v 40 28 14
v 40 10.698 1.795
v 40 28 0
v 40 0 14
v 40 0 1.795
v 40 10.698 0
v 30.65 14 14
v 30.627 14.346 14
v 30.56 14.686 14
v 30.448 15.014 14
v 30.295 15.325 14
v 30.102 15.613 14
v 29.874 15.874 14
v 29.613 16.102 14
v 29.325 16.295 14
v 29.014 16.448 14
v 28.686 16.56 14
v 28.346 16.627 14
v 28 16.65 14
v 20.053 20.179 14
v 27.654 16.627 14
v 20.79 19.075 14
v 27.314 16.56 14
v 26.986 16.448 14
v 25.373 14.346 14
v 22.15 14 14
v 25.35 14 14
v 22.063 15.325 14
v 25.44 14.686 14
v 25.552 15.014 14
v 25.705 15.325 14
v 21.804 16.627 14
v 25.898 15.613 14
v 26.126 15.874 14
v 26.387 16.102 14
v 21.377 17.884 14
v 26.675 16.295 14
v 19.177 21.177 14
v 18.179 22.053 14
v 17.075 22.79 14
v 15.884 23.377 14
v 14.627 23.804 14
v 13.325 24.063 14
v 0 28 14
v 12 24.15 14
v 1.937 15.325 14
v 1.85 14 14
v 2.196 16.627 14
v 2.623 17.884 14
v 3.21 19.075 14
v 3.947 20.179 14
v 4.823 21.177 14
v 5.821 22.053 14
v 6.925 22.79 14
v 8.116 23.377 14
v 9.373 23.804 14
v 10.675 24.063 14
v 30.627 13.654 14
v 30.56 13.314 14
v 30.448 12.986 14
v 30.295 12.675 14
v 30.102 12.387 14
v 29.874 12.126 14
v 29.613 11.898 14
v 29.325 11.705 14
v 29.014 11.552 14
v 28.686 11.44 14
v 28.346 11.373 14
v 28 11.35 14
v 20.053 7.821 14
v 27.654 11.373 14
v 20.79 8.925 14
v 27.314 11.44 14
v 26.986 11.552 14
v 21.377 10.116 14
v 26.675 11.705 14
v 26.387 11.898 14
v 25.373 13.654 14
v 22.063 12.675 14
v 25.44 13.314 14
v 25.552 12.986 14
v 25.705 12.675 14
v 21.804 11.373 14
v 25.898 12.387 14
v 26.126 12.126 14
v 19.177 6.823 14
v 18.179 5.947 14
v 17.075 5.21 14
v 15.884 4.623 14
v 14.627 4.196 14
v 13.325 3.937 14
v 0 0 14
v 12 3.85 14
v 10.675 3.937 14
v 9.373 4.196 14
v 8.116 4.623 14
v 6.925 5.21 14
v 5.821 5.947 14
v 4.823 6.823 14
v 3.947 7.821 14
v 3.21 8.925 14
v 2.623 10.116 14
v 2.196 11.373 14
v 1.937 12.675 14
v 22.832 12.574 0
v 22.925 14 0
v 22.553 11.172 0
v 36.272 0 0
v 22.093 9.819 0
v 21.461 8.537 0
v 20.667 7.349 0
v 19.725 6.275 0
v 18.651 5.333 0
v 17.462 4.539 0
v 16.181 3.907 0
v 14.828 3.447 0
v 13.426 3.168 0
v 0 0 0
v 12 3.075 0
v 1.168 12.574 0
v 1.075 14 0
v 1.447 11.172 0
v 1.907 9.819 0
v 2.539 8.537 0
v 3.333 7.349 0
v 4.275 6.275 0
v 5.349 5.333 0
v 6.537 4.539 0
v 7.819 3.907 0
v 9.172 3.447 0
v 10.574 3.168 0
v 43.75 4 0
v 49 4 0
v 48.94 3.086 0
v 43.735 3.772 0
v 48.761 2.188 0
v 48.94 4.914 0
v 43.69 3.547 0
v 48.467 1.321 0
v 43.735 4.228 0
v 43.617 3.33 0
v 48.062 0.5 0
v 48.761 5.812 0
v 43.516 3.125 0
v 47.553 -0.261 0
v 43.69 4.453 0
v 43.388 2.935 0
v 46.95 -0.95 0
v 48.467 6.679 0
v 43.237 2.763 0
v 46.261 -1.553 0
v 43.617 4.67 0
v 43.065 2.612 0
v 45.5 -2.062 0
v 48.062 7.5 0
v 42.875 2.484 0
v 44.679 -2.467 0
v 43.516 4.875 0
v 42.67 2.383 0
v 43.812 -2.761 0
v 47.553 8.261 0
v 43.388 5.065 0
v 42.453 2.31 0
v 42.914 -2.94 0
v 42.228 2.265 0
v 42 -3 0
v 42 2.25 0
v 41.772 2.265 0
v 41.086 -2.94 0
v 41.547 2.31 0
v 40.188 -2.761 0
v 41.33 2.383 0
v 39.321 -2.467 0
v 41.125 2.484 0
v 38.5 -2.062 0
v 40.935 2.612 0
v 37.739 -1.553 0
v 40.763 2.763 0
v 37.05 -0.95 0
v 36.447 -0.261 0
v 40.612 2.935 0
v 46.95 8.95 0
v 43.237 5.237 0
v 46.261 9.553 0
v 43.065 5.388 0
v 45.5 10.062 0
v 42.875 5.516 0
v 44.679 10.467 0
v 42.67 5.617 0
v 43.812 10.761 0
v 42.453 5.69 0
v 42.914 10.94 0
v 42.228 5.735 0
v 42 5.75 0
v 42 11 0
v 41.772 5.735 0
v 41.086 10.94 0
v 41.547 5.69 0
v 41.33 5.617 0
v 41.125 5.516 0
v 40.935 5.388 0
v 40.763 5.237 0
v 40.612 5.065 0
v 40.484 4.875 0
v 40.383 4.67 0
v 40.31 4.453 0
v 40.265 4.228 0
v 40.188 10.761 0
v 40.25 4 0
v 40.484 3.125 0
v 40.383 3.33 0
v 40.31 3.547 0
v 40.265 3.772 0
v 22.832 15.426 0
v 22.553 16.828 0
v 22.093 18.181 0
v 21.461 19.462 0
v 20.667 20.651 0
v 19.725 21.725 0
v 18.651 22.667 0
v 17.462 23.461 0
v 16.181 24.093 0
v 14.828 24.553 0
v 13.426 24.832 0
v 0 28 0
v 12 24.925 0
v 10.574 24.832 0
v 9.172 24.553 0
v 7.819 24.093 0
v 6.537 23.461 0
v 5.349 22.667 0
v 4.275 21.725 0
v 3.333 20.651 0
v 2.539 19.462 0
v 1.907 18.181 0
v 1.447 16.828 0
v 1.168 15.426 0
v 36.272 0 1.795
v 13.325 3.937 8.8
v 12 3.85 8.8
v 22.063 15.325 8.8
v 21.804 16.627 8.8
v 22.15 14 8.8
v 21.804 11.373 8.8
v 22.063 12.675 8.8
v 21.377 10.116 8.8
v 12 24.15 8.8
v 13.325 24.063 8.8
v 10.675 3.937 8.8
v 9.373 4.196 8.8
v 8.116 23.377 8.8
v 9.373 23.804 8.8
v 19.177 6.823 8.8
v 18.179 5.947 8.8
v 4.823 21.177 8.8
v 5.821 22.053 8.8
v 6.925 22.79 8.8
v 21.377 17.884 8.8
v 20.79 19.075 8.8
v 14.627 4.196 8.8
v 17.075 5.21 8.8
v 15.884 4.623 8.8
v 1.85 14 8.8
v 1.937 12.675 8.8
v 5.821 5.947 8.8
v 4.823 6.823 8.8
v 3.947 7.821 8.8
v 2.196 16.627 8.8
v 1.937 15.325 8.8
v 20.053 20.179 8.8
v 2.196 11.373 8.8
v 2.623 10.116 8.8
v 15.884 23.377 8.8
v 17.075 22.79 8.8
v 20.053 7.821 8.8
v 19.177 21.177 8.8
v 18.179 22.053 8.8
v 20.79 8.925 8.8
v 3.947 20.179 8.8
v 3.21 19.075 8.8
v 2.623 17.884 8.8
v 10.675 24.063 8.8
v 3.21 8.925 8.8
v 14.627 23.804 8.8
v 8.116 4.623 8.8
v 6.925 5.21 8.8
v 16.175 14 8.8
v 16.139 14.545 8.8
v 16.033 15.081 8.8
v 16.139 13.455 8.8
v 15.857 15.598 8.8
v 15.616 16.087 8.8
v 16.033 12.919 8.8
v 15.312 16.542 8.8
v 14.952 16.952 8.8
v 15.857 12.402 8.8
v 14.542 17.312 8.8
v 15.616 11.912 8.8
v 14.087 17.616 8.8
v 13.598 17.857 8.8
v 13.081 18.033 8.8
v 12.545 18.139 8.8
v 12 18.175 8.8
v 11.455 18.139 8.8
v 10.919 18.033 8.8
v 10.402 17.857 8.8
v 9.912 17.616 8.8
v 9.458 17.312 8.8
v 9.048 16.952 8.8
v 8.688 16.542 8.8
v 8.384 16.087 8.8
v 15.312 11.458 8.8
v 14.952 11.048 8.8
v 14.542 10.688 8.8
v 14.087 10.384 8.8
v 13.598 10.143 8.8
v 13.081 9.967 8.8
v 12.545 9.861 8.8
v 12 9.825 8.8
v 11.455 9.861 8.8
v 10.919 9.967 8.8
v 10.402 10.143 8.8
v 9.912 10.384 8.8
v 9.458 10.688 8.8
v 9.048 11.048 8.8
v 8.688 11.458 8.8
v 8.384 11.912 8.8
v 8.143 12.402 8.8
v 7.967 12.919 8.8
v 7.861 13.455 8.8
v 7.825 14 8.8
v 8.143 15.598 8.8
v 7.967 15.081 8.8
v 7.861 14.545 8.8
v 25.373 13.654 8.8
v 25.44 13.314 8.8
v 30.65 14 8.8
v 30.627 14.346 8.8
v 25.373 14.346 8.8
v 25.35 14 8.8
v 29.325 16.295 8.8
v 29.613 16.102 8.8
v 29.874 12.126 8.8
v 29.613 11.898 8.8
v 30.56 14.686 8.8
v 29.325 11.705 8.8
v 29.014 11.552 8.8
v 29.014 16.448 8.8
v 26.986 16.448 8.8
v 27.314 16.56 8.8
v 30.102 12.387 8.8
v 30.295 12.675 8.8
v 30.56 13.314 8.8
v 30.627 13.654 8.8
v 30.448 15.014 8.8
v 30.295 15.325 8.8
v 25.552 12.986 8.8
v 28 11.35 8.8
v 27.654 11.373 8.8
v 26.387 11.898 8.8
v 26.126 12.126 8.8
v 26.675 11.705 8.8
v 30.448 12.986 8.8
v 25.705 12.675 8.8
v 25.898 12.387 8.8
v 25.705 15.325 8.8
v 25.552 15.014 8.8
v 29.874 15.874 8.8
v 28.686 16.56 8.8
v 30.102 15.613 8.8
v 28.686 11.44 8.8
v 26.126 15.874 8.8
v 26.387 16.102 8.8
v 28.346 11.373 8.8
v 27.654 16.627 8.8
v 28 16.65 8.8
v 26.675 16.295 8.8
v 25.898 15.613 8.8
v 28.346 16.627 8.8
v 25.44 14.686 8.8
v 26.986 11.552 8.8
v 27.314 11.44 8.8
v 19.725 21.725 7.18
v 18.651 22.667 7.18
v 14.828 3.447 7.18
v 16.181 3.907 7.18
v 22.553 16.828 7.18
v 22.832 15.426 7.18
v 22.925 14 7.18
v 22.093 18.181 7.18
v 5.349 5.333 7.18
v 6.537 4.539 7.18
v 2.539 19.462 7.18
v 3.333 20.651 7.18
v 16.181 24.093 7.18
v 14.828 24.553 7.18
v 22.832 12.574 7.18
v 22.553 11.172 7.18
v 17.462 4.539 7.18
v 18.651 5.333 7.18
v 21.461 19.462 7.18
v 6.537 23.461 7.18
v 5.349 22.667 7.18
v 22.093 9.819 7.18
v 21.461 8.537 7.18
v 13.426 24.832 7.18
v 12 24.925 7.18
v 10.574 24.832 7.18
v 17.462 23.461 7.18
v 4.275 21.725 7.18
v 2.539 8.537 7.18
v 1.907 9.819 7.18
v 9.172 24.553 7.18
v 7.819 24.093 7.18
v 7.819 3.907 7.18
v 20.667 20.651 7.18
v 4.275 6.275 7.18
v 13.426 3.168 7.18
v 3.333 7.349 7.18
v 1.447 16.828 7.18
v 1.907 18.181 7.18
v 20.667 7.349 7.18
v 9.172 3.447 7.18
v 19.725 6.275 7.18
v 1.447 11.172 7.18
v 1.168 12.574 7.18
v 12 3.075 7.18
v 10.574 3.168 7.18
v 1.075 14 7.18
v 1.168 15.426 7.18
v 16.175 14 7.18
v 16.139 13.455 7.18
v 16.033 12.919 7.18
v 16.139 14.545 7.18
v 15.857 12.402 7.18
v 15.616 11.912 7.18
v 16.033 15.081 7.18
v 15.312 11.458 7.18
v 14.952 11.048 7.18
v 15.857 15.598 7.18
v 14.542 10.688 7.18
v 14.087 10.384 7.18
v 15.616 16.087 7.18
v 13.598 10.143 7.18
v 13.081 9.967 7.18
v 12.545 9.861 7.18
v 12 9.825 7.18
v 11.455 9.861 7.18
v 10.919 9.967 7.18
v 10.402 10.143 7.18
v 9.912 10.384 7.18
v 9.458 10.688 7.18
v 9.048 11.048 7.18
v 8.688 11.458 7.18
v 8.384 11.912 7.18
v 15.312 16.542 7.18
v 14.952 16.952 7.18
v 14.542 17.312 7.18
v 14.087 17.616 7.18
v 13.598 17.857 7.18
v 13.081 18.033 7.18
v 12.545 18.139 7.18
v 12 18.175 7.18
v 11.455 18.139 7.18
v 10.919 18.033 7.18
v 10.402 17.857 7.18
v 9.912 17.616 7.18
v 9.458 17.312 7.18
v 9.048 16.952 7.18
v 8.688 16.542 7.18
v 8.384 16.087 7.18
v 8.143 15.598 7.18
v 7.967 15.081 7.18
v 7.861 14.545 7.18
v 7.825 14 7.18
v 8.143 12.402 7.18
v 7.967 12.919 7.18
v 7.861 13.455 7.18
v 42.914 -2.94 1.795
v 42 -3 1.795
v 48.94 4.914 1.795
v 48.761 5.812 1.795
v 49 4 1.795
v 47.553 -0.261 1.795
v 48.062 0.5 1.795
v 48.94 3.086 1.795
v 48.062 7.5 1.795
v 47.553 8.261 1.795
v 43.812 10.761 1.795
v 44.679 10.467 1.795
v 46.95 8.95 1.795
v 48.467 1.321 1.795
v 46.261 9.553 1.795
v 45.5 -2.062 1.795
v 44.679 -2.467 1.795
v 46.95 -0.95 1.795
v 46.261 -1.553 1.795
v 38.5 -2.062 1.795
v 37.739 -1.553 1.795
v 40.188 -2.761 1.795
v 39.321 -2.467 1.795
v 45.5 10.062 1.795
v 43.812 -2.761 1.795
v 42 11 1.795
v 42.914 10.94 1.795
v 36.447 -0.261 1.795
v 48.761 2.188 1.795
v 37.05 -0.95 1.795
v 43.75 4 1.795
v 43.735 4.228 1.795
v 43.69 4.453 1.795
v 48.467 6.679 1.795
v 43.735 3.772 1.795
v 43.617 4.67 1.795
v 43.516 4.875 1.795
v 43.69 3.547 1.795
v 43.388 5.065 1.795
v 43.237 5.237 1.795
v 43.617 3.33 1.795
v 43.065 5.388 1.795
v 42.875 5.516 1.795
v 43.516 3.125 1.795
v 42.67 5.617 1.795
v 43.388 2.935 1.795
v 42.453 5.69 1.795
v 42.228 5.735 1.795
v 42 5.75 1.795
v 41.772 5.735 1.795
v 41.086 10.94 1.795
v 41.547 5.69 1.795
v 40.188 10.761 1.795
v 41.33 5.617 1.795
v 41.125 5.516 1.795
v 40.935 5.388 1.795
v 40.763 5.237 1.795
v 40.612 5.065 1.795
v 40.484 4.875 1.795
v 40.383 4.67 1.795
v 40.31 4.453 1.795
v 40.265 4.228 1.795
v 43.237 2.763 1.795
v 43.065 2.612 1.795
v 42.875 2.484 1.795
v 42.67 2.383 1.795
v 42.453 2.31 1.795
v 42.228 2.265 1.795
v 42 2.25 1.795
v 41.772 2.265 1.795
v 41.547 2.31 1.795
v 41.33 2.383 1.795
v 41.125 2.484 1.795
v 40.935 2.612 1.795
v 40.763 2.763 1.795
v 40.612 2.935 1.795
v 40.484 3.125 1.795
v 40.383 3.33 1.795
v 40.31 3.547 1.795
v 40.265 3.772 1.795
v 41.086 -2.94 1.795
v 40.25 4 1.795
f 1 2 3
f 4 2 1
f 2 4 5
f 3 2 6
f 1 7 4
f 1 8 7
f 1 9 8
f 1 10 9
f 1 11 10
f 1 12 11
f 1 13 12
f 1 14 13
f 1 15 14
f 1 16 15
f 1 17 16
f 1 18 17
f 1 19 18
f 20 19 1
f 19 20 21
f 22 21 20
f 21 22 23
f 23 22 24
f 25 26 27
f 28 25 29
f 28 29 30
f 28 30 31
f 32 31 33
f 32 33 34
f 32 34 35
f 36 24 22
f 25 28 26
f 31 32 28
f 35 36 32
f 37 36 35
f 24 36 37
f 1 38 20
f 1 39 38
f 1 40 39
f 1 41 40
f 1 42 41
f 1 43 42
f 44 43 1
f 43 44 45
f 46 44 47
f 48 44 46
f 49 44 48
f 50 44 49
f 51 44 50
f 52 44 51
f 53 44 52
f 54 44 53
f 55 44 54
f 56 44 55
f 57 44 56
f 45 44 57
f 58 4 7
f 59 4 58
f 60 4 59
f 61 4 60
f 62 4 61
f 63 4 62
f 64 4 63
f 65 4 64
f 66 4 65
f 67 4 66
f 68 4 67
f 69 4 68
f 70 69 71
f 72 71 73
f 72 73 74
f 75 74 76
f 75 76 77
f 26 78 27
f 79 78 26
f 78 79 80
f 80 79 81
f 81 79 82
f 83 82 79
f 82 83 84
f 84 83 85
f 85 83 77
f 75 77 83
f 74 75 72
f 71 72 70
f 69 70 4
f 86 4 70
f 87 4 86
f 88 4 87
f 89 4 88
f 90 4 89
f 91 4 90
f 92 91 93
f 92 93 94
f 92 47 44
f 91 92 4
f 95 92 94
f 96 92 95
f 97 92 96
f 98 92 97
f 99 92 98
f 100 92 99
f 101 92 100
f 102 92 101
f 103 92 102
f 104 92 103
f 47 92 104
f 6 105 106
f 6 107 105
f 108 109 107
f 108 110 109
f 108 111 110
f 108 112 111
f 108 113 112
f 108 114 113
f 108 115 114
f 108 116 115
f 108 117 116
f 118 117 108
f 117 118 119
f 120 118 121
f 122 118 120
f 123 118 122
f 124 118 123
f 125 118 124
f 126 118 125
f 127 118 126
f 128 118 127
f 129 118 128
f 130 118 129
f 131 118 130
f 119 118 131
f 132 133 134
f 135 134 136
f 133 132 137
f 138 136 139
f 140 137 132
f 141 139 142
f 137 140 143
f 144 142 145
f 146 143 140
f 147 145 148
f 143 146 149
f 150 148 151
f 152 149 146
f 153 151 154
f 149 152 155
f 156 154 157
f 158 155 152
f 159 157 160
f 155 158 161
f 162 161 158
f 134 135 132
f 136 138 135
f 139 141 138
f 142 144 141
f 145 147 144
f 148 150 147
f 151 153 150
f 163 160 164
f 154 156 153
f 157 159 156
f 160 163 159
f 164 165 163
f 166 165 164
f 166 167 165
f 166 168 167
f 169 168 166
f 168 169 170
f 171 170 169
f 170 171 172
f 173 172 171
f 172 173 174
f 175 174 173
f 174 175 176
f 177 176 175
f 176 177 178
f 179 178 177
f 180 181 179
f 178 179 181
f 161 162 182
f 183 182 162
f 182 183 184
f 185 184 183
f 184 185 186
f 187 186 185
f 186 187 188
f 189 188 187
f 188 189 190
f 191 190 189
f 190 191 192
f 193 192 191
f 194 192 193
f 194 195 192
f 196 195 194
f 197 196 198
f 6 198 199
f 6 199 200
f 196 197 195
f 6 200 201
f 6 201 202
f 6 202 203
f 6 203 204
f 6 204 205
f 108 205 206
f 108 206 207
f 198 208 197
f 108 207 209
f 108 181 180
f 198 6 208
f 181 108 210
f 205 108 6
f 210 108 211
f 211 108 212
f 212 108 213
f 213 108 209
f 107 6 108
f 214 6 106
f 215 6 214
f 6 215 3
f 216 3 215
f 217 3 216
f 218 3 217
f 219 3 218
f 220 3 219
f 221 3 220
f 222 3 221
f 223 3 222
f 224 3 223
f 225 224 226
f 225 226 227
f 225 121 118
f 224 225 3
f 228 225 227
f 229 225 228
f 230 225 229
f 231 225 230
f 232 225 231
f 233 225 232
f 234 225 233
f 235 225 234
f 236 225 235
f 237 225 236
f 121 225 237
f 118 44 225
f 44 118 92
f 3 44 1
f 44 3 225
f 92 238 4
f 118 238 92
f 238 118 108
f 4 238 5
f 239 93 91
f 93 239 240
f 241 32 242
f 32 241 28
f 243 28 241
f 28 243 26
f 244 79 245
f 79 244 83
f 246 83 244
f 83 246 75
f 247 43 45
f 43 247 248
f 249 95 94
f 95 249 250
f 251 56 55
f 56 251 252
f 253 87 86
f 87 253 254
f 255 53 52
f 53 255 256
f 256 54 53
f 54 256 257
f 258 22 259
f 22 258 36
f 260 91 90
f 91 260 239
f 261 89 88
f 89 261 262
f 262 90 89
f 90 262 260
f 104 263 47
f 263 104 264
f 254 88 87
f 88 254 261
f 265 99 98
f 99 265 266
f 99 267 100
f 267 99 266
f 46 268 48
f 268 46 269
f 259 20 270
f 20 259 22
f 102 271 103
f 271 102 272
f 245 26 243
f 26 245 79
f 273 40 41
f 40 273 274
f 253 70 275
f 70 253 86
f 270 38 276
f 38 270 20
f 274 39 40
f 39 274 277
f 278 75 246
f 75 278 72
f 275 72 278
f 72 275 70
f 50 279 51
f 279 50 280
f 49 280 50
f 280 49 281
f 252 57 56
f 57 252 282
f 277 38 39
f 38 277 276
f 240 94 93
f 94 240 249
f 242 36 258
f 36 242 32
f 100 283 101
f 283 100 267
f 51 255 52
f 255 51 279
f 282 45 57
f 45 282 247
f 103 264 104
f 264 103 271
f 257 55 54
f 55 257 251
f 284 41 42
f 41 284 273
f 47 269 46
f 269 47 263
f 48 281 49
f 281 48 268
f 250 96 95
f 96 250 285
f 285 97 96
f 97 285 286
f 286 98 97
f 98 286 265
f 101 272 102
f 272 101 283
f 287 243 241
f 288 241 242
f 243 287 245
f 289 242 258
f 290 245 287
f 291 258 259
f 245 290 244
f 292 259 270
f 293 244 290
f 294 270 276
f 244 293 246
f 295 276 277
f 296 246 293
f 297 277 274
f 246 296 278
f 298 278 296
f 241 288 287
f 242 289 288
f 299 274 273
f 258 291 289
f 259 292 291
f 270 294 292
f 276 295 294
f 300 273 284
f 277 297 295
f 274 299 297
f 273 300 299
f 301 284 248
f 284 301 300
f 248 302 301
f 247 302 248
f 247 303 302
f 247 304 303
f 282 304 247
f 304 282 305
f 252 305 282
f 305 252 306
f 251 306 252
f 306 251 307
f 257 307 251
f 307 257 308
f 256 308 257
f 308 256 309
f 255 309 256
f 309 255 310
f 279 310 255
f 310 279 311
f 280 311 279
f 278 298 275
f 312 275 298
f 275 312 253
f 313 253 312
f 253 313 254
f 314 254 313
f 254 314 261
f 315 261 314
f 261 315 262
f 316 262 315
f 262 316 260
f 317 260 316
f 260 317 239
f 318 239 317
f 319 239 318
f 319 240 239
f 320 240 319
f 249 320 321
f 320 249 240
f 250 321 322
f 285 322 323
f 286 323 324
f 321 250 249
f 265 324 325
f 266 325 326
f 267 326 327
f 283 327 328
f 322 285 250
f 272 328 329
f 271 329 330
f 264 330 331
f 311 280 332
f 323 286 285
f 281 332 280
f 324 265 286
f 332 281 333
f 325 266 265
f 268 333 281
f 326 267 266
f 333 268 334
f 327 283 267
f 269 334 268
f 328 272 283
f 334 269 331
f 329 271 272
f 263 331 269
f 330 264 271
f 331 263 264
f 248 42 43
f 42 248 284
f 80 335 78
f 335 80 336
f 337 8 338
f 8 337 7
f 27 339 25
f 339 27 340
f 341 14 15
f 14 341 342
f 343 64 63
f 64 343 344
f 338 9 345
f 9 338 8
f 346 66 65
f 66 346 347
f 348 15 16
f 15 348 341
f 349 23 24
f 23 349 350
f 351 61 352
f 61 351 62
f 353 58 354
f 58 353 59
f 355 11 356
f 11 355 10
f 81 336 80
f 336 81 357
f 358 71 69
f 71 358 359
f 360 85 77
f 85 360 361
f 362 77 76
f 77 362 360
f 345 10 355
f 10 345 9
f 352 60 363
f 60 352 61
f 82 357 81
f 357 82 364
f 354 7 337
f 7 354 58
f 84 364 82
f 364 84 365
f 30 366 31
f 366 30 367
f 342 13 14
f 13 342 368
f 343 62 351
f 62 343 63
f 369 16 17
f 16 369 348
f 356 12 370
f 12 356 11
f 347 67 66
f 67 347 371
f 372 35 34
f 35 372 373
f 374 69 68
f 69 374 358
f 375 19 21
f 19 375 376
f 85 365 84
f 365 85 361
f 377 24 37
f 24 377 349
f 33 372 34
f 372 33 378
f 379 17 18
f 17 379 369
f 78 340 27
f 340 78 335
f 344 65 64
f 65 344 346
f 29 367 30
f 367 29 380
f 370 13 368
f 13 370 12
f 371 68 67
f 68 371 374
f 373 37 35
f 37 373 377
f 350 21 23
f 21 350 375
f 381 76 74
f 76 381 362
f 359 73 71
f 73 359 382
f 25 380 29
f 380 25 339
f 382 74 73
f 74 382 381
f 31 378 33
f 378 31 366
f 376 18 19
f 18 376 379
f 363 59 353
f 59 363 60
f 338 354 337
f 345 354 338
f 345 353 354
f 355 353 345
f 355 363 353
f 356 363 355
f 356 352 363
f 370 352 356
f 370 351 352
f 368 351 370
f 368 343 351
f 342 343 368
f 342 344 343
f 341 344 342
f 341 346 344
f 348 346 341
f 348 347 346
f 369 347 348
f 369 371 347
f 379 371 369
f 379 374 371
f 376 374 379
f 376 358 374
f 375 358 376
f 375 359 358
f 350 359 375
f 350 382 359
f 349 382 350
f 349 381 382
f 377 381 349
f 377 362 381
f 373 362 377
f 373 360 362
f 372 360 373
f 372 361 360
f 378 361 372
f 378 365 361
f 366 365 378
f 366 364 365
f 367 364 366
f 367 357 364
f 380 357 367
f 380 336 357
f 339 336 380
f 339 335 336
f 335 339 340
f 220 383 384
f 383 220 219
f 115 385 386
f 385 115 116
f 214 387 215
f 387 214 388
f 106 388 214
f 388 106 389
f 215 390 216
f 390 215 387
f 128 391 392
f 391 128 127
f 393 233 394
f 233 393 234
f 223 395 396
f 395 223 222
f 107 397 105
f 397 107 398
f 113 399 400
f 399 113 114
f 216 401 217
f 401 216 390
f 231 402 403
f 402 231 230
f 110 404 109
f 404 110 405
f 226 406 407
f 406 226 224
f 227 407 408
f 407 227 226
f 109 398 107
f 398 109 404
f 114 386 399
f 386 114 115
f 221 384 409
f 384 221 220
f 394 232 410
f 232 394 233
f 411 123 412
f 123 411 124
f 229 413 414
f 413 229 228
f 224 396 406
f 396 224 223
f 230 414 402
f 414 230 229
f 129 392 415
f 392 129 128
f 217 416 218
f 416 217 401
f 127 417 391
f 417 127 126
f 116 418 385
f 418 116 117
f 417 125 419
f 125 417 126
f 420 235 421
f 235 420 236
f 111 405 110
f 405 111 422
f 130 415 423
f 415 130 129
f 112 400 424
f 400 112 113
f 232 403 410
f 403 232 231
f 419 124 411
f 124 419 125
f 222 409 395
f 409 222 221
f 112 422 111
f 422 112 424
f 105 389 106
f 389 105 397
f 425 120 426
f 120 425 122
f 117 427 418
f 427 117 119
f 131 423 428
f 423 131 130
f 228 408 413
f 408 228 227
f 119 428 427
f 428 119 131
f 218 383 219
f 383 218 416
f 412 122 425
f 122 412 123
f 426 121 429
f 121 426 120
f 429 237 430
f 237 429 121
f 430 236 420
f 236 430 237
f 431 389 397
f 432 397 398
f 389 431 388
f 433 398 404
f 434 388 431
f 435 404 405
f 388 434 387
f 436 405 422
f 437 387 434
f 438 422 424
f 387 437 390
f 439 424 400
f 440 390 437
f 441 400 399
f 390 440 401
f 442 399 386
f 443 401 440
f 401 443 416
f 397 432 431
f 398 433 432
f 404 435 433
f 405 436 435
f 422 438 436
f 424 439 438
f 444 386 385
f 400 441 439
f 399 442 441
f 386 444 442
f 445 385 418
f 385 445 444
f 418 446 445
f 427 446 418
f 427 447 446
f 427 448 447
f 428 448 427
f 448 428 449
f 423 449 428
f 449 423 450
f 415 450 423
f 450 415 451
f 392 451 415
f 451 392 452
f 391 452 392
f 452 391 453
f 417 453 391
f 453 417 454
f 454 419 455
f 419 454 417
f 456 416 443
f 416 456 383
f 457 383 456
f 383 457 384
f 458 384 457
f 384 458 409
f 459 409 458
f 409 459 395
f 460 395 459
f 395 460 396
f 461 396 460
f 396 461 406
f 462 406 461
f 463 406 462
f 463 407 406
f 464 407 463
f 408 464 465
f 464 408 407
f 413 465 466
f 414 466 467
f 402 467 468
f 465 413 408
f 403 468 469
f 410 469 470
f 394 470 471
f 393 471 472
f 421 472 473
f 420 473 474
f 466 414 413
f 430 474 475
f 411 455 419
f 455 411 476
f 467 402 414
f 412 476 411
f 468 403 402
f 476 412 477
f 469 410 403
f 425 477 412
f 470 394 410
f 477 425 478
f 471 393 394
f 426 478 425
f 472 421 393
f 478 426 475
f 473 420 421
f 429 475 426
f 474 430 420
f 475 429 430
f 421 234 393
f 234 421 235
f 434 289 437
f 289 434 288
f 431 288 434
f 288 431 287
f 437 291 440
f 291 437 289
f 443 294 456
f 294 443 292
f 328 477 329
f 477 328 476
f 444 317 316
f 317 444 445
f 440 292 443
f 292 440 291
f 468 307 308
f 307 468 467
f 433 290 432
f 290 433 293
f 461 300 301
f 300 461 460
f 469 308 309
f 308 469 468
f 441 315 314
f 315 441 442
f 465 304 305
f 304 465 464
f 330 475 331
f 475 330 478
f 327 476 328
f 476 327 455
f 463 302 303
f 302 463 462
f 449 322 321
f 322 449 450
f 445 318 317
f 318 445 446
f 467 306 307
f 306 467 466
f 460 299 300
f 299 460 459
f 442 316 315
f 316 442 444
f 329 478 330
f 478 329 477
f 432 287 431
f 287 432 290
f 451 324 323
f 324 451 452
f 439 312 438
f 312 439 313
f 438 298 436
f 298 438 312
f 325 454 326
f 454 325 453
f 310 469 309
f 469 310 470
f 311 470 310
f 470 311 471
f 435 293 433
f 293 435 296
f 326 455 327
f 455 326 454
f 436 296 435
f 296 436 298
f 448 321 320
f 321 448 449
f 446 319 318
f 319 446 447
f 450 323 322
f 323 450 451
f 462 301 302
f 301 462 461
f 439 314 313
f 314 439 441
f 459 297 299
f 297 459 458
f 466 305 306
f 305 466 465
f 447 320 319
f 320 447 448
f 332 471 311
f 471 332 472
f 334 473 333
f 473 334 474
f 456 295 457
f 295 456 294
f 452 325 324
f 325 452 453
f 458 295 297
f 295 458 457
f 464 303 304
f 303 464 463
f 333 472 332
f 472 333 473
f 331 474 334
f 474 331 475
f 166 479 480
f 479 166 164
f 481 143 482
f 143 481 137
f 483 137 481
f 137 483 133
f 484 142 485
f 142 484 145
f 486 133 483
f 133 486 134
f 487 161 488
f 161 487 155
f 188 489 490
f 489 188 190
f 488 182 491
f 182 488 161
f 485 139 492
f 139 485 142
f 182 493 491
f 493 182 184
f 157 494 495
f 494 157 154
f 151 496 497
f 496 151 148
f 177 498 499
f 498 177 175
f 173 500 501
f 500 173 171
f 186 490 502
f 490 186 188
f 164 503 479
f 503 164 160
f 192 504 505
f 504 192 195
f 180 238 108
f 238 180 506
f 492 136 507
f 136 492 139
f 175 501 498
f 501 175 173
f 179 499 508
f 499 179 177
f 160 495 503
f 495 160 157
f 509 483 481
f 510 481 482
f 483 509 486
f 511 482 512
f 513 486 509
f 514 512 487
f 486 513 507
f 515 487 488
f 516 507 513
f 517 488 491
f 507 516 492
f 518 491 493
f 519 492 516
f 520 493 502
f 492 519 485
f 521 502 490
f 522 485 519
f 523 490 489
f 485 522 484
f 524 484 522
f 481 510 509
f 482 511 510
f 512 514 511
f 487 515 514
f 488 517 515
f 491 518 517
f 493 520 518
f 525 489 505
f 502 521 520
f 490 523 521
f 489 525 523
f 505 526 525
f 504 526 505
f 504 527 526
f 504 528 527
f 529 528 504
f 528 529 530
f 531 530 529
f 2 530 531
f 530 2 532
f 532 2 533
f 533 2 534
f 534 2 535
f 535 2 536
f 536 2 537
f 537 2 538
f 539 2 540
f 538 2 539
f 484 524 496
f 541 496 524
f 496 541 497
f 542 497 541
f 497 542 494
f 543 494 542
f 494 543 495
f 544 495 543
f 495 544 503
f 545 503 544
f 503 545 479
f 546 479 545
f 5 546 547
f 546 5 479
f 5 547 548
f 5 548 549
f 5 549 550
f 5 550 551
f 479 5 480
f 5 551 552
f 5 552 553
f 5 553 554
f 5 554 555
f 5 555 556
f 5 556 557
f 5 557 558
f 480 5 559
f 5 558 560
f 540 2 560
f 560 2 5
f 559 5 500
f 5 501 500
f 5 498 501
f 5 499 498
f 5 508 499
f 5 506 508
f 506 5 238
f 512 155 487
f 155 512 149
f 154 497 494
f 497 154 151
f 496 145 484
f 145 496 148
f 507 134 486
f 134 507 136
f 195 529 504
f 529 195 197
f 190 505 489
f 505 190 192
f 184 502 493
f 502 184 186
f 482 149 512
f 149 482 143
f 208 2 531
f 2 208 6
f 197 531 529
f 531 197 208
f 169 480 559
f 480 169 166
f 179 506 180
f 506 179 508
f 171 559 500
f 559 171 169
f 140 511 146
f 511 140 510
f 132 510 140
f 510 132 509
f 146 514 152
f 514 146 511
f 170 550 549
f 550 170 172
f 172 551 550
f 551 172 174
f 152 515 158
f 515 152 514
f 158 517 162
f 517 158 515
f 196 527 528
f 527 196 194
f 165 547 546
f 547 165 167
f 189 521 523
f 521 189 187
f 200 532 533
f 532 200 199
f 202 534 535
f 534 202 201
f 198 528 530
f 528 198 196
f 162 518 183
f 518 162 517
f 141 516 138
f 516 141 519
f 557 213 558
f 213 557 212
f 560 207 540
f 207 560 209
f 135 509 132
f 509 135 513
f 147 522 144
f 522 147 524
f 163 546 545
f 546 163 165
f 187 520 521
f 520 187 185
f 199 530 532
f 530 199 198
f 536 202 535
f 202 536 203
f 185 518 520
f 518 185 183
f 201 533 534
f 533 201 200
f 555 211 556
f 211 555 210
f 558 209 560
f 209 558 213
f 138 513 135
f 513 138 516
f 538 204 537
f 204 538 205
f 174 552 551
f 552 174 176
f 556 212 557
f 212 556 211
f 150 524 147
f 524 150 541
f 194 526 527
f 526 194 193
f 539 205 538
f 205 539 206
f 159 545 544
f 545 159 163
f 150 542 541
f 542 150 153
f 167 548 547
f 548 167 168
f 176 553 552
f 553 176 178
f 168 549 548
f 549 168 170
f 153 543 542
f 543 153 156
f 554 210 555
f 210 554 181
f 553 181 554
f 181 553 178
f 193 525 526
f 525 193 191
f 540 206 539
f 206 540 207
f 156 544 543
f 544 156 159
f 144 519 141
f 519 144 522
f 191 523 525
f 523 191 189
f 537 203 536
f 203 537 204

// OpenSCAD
// file: parameters.scad
// =============================================================================
// Gen-M Dual-stator sandwich AFPM — WOUND-AWARE parameters (HARD GATE)
// Evolution of withdrawn Gen-J. Magnet face ↔ WOUND coil face ≥ 0.8 mm.
// =============================================================================

// --- Wire / wind budget (26 AWG, ~1 lb spool) ---------------------------------
wire_awg            = 26;
wire_od             = 0.45;     // insulated OD mm (audit assumption)
turns               = 120;      // design turns per pancake
fill                = 0.70;     // packing factor for build estimate
layers_per_face     = 3;        // axial layers budgeted proud of EACH flange
wind_build_axial    = layers_per_face * wire_od * fill;   // 3*0.45*0.7 = 0.945 mm
wind_build_radial   = 2 * wire_od * fill;                 // ~0.63 mm radial overfill budget

// --- Pancake former (bare STL) -----------------------------------------------
coil_id_r           = 24.0;
coil_od_r           = 56.0;
span_deg            = 34.0;     // 9 stations × 40° pitch, 34° copper span
former_web          = 3.2;      // core / web between flanges
flange_t            = 1.0;
wall                = 1.2;      // ≥0.8; load wall 1.2
slot_w              = 2.4;
mount_hole          = 3.5;      // M3 clear
tab_len             = 7.0;

former_bare_h       = former_web + 2 * flange_t;          // 5.2 mm
coil_envelope_h     = former_bare_h + 2 * wind_build_axial; // 7.09 mm

// --- Running clearance (magnet face → WOUND face) ----------------------------
run_clear           = 0.85;     // ≥ 0.8 mm after stated wind
// Front wind stands proud of stator face by wind_build_axial when bay seats
// bare former + back-face copper. Spacer sets magnet → stator face:
gap_spacer_h        = run_clear + wind_build_axial;       // 1.795 ≈ 1.80 mm
// ⇒ magnet_to_wound = gap_spacer_h - wind_build_axial = run_clear = 0.85 mm PASS

// --- Stator bay (sized to WOUND radial + axial, not bare former) -------------
coil_stations       = 9;        // 9+9; document if 12+12 won't one-plate
bay_r_in            = coil_id_r - 2.0 - wind_build_radial;  // ~21.37
bay_r_out           = coil_od_r + 2.0 + wind_build_radial;  // ~58.63
bay_span            = span_deg + 4.0;                       // circumferential clear
bay_offset          = 2.0;      // extra pocket clearance beyond wound outline
// Seat bare former + back wind; front wind proud of stator face
bay_depth           = former_bare_h + wind_build_axial;     // 6.145 mm
stator_back_web     = 2.5;
stator_thick        = bay_depth + stator_back_web;          // ~8.65 mm
stator_od           = 152.0;
shaft_clear_stator  = 40.0;
coil_mount_r        = 32.0;

// --- Rotor (dual-face Halbach) -----------------------------------------------
large_pocket_d      = 20.3;
small_pocket_d      = 5.3;
pocket_h            = 5.2;
large_n             = 8;
R_large             = 52.0;
R_small             = [40.0, 52.0, 64.0];
carrier_od          = 148.0;
carrier_thick       = 12.0;     // 5.2 + 1.6 web + 5.2
hub_h               = 10.0;
hub_od              = 30.0;

// --- Modular MAX interface ---------------------------------------------------
shaft_bore          = 8.35;
bearing_d           = 21.85;
bearing_h           = 7.2;
m3_clear            = 3.5;
bolt_r_inner        = 36.0;
bolt_n_inner        = 6;
outer_bolt_r        = 70.0;
outer_bolt_n        = 6;
flange_bolt_r       = 72.0;     // Gen-E family
flange_bolt_n       = 6;
brace_r             = 68.0;
brace_d             = 4.3;
brace_n             = 4;

// --- Gap spacer pad ----------------------------------------------------------
spacer_pad_od       = 14.0;
spacer_pad_id       = m3_clear;

// --- Endbell -----------------------------------------------------------------
endbell_od          = 152.0;
endbell_thick       = 8.0;
endbell_shaft_clear = 10.0;

$fn = 64;
// main file
// Gen-M fit coupon — dual magnet pockets + 608 + gap spacer height check
include <parameters.scad>;
$fn = 48;
block_w = 40; block_d = 28; block_h = 14;
difference() {
    cube([block_w, block_d, block_h]);
    // large pocket
    translate([12, block_d/2, block_h - pocket_h])
        cylinder(d=large_pocket_d, h=pocket_h + 0.2);
    // small pocket
    translate([28, block_d/2, block_h - pocket_h])
        cylinder(d=small_pocket_d, h=pocket_h + 0.2);
    // 608 seat
    translate([12, block_d/2, -0.02])
        cylinder(d=bearing_d, h=bearing_h);
    translate([12, block_d/2, -0.1])
        cylinder(d=shaft_bore, h=block_h + 1);
}
// attached spacer reference tower at documented gap_spacer_h
translate([block_w + 2, 4, 0])
    difference() {
        cylinder(d=spacer_pad_od, h=gap_spacer_h);
        translate([0, 0, -0.1]) cylinder(d=spacer_pad_id, h=gap_spacer_h + 0.2);
    }
